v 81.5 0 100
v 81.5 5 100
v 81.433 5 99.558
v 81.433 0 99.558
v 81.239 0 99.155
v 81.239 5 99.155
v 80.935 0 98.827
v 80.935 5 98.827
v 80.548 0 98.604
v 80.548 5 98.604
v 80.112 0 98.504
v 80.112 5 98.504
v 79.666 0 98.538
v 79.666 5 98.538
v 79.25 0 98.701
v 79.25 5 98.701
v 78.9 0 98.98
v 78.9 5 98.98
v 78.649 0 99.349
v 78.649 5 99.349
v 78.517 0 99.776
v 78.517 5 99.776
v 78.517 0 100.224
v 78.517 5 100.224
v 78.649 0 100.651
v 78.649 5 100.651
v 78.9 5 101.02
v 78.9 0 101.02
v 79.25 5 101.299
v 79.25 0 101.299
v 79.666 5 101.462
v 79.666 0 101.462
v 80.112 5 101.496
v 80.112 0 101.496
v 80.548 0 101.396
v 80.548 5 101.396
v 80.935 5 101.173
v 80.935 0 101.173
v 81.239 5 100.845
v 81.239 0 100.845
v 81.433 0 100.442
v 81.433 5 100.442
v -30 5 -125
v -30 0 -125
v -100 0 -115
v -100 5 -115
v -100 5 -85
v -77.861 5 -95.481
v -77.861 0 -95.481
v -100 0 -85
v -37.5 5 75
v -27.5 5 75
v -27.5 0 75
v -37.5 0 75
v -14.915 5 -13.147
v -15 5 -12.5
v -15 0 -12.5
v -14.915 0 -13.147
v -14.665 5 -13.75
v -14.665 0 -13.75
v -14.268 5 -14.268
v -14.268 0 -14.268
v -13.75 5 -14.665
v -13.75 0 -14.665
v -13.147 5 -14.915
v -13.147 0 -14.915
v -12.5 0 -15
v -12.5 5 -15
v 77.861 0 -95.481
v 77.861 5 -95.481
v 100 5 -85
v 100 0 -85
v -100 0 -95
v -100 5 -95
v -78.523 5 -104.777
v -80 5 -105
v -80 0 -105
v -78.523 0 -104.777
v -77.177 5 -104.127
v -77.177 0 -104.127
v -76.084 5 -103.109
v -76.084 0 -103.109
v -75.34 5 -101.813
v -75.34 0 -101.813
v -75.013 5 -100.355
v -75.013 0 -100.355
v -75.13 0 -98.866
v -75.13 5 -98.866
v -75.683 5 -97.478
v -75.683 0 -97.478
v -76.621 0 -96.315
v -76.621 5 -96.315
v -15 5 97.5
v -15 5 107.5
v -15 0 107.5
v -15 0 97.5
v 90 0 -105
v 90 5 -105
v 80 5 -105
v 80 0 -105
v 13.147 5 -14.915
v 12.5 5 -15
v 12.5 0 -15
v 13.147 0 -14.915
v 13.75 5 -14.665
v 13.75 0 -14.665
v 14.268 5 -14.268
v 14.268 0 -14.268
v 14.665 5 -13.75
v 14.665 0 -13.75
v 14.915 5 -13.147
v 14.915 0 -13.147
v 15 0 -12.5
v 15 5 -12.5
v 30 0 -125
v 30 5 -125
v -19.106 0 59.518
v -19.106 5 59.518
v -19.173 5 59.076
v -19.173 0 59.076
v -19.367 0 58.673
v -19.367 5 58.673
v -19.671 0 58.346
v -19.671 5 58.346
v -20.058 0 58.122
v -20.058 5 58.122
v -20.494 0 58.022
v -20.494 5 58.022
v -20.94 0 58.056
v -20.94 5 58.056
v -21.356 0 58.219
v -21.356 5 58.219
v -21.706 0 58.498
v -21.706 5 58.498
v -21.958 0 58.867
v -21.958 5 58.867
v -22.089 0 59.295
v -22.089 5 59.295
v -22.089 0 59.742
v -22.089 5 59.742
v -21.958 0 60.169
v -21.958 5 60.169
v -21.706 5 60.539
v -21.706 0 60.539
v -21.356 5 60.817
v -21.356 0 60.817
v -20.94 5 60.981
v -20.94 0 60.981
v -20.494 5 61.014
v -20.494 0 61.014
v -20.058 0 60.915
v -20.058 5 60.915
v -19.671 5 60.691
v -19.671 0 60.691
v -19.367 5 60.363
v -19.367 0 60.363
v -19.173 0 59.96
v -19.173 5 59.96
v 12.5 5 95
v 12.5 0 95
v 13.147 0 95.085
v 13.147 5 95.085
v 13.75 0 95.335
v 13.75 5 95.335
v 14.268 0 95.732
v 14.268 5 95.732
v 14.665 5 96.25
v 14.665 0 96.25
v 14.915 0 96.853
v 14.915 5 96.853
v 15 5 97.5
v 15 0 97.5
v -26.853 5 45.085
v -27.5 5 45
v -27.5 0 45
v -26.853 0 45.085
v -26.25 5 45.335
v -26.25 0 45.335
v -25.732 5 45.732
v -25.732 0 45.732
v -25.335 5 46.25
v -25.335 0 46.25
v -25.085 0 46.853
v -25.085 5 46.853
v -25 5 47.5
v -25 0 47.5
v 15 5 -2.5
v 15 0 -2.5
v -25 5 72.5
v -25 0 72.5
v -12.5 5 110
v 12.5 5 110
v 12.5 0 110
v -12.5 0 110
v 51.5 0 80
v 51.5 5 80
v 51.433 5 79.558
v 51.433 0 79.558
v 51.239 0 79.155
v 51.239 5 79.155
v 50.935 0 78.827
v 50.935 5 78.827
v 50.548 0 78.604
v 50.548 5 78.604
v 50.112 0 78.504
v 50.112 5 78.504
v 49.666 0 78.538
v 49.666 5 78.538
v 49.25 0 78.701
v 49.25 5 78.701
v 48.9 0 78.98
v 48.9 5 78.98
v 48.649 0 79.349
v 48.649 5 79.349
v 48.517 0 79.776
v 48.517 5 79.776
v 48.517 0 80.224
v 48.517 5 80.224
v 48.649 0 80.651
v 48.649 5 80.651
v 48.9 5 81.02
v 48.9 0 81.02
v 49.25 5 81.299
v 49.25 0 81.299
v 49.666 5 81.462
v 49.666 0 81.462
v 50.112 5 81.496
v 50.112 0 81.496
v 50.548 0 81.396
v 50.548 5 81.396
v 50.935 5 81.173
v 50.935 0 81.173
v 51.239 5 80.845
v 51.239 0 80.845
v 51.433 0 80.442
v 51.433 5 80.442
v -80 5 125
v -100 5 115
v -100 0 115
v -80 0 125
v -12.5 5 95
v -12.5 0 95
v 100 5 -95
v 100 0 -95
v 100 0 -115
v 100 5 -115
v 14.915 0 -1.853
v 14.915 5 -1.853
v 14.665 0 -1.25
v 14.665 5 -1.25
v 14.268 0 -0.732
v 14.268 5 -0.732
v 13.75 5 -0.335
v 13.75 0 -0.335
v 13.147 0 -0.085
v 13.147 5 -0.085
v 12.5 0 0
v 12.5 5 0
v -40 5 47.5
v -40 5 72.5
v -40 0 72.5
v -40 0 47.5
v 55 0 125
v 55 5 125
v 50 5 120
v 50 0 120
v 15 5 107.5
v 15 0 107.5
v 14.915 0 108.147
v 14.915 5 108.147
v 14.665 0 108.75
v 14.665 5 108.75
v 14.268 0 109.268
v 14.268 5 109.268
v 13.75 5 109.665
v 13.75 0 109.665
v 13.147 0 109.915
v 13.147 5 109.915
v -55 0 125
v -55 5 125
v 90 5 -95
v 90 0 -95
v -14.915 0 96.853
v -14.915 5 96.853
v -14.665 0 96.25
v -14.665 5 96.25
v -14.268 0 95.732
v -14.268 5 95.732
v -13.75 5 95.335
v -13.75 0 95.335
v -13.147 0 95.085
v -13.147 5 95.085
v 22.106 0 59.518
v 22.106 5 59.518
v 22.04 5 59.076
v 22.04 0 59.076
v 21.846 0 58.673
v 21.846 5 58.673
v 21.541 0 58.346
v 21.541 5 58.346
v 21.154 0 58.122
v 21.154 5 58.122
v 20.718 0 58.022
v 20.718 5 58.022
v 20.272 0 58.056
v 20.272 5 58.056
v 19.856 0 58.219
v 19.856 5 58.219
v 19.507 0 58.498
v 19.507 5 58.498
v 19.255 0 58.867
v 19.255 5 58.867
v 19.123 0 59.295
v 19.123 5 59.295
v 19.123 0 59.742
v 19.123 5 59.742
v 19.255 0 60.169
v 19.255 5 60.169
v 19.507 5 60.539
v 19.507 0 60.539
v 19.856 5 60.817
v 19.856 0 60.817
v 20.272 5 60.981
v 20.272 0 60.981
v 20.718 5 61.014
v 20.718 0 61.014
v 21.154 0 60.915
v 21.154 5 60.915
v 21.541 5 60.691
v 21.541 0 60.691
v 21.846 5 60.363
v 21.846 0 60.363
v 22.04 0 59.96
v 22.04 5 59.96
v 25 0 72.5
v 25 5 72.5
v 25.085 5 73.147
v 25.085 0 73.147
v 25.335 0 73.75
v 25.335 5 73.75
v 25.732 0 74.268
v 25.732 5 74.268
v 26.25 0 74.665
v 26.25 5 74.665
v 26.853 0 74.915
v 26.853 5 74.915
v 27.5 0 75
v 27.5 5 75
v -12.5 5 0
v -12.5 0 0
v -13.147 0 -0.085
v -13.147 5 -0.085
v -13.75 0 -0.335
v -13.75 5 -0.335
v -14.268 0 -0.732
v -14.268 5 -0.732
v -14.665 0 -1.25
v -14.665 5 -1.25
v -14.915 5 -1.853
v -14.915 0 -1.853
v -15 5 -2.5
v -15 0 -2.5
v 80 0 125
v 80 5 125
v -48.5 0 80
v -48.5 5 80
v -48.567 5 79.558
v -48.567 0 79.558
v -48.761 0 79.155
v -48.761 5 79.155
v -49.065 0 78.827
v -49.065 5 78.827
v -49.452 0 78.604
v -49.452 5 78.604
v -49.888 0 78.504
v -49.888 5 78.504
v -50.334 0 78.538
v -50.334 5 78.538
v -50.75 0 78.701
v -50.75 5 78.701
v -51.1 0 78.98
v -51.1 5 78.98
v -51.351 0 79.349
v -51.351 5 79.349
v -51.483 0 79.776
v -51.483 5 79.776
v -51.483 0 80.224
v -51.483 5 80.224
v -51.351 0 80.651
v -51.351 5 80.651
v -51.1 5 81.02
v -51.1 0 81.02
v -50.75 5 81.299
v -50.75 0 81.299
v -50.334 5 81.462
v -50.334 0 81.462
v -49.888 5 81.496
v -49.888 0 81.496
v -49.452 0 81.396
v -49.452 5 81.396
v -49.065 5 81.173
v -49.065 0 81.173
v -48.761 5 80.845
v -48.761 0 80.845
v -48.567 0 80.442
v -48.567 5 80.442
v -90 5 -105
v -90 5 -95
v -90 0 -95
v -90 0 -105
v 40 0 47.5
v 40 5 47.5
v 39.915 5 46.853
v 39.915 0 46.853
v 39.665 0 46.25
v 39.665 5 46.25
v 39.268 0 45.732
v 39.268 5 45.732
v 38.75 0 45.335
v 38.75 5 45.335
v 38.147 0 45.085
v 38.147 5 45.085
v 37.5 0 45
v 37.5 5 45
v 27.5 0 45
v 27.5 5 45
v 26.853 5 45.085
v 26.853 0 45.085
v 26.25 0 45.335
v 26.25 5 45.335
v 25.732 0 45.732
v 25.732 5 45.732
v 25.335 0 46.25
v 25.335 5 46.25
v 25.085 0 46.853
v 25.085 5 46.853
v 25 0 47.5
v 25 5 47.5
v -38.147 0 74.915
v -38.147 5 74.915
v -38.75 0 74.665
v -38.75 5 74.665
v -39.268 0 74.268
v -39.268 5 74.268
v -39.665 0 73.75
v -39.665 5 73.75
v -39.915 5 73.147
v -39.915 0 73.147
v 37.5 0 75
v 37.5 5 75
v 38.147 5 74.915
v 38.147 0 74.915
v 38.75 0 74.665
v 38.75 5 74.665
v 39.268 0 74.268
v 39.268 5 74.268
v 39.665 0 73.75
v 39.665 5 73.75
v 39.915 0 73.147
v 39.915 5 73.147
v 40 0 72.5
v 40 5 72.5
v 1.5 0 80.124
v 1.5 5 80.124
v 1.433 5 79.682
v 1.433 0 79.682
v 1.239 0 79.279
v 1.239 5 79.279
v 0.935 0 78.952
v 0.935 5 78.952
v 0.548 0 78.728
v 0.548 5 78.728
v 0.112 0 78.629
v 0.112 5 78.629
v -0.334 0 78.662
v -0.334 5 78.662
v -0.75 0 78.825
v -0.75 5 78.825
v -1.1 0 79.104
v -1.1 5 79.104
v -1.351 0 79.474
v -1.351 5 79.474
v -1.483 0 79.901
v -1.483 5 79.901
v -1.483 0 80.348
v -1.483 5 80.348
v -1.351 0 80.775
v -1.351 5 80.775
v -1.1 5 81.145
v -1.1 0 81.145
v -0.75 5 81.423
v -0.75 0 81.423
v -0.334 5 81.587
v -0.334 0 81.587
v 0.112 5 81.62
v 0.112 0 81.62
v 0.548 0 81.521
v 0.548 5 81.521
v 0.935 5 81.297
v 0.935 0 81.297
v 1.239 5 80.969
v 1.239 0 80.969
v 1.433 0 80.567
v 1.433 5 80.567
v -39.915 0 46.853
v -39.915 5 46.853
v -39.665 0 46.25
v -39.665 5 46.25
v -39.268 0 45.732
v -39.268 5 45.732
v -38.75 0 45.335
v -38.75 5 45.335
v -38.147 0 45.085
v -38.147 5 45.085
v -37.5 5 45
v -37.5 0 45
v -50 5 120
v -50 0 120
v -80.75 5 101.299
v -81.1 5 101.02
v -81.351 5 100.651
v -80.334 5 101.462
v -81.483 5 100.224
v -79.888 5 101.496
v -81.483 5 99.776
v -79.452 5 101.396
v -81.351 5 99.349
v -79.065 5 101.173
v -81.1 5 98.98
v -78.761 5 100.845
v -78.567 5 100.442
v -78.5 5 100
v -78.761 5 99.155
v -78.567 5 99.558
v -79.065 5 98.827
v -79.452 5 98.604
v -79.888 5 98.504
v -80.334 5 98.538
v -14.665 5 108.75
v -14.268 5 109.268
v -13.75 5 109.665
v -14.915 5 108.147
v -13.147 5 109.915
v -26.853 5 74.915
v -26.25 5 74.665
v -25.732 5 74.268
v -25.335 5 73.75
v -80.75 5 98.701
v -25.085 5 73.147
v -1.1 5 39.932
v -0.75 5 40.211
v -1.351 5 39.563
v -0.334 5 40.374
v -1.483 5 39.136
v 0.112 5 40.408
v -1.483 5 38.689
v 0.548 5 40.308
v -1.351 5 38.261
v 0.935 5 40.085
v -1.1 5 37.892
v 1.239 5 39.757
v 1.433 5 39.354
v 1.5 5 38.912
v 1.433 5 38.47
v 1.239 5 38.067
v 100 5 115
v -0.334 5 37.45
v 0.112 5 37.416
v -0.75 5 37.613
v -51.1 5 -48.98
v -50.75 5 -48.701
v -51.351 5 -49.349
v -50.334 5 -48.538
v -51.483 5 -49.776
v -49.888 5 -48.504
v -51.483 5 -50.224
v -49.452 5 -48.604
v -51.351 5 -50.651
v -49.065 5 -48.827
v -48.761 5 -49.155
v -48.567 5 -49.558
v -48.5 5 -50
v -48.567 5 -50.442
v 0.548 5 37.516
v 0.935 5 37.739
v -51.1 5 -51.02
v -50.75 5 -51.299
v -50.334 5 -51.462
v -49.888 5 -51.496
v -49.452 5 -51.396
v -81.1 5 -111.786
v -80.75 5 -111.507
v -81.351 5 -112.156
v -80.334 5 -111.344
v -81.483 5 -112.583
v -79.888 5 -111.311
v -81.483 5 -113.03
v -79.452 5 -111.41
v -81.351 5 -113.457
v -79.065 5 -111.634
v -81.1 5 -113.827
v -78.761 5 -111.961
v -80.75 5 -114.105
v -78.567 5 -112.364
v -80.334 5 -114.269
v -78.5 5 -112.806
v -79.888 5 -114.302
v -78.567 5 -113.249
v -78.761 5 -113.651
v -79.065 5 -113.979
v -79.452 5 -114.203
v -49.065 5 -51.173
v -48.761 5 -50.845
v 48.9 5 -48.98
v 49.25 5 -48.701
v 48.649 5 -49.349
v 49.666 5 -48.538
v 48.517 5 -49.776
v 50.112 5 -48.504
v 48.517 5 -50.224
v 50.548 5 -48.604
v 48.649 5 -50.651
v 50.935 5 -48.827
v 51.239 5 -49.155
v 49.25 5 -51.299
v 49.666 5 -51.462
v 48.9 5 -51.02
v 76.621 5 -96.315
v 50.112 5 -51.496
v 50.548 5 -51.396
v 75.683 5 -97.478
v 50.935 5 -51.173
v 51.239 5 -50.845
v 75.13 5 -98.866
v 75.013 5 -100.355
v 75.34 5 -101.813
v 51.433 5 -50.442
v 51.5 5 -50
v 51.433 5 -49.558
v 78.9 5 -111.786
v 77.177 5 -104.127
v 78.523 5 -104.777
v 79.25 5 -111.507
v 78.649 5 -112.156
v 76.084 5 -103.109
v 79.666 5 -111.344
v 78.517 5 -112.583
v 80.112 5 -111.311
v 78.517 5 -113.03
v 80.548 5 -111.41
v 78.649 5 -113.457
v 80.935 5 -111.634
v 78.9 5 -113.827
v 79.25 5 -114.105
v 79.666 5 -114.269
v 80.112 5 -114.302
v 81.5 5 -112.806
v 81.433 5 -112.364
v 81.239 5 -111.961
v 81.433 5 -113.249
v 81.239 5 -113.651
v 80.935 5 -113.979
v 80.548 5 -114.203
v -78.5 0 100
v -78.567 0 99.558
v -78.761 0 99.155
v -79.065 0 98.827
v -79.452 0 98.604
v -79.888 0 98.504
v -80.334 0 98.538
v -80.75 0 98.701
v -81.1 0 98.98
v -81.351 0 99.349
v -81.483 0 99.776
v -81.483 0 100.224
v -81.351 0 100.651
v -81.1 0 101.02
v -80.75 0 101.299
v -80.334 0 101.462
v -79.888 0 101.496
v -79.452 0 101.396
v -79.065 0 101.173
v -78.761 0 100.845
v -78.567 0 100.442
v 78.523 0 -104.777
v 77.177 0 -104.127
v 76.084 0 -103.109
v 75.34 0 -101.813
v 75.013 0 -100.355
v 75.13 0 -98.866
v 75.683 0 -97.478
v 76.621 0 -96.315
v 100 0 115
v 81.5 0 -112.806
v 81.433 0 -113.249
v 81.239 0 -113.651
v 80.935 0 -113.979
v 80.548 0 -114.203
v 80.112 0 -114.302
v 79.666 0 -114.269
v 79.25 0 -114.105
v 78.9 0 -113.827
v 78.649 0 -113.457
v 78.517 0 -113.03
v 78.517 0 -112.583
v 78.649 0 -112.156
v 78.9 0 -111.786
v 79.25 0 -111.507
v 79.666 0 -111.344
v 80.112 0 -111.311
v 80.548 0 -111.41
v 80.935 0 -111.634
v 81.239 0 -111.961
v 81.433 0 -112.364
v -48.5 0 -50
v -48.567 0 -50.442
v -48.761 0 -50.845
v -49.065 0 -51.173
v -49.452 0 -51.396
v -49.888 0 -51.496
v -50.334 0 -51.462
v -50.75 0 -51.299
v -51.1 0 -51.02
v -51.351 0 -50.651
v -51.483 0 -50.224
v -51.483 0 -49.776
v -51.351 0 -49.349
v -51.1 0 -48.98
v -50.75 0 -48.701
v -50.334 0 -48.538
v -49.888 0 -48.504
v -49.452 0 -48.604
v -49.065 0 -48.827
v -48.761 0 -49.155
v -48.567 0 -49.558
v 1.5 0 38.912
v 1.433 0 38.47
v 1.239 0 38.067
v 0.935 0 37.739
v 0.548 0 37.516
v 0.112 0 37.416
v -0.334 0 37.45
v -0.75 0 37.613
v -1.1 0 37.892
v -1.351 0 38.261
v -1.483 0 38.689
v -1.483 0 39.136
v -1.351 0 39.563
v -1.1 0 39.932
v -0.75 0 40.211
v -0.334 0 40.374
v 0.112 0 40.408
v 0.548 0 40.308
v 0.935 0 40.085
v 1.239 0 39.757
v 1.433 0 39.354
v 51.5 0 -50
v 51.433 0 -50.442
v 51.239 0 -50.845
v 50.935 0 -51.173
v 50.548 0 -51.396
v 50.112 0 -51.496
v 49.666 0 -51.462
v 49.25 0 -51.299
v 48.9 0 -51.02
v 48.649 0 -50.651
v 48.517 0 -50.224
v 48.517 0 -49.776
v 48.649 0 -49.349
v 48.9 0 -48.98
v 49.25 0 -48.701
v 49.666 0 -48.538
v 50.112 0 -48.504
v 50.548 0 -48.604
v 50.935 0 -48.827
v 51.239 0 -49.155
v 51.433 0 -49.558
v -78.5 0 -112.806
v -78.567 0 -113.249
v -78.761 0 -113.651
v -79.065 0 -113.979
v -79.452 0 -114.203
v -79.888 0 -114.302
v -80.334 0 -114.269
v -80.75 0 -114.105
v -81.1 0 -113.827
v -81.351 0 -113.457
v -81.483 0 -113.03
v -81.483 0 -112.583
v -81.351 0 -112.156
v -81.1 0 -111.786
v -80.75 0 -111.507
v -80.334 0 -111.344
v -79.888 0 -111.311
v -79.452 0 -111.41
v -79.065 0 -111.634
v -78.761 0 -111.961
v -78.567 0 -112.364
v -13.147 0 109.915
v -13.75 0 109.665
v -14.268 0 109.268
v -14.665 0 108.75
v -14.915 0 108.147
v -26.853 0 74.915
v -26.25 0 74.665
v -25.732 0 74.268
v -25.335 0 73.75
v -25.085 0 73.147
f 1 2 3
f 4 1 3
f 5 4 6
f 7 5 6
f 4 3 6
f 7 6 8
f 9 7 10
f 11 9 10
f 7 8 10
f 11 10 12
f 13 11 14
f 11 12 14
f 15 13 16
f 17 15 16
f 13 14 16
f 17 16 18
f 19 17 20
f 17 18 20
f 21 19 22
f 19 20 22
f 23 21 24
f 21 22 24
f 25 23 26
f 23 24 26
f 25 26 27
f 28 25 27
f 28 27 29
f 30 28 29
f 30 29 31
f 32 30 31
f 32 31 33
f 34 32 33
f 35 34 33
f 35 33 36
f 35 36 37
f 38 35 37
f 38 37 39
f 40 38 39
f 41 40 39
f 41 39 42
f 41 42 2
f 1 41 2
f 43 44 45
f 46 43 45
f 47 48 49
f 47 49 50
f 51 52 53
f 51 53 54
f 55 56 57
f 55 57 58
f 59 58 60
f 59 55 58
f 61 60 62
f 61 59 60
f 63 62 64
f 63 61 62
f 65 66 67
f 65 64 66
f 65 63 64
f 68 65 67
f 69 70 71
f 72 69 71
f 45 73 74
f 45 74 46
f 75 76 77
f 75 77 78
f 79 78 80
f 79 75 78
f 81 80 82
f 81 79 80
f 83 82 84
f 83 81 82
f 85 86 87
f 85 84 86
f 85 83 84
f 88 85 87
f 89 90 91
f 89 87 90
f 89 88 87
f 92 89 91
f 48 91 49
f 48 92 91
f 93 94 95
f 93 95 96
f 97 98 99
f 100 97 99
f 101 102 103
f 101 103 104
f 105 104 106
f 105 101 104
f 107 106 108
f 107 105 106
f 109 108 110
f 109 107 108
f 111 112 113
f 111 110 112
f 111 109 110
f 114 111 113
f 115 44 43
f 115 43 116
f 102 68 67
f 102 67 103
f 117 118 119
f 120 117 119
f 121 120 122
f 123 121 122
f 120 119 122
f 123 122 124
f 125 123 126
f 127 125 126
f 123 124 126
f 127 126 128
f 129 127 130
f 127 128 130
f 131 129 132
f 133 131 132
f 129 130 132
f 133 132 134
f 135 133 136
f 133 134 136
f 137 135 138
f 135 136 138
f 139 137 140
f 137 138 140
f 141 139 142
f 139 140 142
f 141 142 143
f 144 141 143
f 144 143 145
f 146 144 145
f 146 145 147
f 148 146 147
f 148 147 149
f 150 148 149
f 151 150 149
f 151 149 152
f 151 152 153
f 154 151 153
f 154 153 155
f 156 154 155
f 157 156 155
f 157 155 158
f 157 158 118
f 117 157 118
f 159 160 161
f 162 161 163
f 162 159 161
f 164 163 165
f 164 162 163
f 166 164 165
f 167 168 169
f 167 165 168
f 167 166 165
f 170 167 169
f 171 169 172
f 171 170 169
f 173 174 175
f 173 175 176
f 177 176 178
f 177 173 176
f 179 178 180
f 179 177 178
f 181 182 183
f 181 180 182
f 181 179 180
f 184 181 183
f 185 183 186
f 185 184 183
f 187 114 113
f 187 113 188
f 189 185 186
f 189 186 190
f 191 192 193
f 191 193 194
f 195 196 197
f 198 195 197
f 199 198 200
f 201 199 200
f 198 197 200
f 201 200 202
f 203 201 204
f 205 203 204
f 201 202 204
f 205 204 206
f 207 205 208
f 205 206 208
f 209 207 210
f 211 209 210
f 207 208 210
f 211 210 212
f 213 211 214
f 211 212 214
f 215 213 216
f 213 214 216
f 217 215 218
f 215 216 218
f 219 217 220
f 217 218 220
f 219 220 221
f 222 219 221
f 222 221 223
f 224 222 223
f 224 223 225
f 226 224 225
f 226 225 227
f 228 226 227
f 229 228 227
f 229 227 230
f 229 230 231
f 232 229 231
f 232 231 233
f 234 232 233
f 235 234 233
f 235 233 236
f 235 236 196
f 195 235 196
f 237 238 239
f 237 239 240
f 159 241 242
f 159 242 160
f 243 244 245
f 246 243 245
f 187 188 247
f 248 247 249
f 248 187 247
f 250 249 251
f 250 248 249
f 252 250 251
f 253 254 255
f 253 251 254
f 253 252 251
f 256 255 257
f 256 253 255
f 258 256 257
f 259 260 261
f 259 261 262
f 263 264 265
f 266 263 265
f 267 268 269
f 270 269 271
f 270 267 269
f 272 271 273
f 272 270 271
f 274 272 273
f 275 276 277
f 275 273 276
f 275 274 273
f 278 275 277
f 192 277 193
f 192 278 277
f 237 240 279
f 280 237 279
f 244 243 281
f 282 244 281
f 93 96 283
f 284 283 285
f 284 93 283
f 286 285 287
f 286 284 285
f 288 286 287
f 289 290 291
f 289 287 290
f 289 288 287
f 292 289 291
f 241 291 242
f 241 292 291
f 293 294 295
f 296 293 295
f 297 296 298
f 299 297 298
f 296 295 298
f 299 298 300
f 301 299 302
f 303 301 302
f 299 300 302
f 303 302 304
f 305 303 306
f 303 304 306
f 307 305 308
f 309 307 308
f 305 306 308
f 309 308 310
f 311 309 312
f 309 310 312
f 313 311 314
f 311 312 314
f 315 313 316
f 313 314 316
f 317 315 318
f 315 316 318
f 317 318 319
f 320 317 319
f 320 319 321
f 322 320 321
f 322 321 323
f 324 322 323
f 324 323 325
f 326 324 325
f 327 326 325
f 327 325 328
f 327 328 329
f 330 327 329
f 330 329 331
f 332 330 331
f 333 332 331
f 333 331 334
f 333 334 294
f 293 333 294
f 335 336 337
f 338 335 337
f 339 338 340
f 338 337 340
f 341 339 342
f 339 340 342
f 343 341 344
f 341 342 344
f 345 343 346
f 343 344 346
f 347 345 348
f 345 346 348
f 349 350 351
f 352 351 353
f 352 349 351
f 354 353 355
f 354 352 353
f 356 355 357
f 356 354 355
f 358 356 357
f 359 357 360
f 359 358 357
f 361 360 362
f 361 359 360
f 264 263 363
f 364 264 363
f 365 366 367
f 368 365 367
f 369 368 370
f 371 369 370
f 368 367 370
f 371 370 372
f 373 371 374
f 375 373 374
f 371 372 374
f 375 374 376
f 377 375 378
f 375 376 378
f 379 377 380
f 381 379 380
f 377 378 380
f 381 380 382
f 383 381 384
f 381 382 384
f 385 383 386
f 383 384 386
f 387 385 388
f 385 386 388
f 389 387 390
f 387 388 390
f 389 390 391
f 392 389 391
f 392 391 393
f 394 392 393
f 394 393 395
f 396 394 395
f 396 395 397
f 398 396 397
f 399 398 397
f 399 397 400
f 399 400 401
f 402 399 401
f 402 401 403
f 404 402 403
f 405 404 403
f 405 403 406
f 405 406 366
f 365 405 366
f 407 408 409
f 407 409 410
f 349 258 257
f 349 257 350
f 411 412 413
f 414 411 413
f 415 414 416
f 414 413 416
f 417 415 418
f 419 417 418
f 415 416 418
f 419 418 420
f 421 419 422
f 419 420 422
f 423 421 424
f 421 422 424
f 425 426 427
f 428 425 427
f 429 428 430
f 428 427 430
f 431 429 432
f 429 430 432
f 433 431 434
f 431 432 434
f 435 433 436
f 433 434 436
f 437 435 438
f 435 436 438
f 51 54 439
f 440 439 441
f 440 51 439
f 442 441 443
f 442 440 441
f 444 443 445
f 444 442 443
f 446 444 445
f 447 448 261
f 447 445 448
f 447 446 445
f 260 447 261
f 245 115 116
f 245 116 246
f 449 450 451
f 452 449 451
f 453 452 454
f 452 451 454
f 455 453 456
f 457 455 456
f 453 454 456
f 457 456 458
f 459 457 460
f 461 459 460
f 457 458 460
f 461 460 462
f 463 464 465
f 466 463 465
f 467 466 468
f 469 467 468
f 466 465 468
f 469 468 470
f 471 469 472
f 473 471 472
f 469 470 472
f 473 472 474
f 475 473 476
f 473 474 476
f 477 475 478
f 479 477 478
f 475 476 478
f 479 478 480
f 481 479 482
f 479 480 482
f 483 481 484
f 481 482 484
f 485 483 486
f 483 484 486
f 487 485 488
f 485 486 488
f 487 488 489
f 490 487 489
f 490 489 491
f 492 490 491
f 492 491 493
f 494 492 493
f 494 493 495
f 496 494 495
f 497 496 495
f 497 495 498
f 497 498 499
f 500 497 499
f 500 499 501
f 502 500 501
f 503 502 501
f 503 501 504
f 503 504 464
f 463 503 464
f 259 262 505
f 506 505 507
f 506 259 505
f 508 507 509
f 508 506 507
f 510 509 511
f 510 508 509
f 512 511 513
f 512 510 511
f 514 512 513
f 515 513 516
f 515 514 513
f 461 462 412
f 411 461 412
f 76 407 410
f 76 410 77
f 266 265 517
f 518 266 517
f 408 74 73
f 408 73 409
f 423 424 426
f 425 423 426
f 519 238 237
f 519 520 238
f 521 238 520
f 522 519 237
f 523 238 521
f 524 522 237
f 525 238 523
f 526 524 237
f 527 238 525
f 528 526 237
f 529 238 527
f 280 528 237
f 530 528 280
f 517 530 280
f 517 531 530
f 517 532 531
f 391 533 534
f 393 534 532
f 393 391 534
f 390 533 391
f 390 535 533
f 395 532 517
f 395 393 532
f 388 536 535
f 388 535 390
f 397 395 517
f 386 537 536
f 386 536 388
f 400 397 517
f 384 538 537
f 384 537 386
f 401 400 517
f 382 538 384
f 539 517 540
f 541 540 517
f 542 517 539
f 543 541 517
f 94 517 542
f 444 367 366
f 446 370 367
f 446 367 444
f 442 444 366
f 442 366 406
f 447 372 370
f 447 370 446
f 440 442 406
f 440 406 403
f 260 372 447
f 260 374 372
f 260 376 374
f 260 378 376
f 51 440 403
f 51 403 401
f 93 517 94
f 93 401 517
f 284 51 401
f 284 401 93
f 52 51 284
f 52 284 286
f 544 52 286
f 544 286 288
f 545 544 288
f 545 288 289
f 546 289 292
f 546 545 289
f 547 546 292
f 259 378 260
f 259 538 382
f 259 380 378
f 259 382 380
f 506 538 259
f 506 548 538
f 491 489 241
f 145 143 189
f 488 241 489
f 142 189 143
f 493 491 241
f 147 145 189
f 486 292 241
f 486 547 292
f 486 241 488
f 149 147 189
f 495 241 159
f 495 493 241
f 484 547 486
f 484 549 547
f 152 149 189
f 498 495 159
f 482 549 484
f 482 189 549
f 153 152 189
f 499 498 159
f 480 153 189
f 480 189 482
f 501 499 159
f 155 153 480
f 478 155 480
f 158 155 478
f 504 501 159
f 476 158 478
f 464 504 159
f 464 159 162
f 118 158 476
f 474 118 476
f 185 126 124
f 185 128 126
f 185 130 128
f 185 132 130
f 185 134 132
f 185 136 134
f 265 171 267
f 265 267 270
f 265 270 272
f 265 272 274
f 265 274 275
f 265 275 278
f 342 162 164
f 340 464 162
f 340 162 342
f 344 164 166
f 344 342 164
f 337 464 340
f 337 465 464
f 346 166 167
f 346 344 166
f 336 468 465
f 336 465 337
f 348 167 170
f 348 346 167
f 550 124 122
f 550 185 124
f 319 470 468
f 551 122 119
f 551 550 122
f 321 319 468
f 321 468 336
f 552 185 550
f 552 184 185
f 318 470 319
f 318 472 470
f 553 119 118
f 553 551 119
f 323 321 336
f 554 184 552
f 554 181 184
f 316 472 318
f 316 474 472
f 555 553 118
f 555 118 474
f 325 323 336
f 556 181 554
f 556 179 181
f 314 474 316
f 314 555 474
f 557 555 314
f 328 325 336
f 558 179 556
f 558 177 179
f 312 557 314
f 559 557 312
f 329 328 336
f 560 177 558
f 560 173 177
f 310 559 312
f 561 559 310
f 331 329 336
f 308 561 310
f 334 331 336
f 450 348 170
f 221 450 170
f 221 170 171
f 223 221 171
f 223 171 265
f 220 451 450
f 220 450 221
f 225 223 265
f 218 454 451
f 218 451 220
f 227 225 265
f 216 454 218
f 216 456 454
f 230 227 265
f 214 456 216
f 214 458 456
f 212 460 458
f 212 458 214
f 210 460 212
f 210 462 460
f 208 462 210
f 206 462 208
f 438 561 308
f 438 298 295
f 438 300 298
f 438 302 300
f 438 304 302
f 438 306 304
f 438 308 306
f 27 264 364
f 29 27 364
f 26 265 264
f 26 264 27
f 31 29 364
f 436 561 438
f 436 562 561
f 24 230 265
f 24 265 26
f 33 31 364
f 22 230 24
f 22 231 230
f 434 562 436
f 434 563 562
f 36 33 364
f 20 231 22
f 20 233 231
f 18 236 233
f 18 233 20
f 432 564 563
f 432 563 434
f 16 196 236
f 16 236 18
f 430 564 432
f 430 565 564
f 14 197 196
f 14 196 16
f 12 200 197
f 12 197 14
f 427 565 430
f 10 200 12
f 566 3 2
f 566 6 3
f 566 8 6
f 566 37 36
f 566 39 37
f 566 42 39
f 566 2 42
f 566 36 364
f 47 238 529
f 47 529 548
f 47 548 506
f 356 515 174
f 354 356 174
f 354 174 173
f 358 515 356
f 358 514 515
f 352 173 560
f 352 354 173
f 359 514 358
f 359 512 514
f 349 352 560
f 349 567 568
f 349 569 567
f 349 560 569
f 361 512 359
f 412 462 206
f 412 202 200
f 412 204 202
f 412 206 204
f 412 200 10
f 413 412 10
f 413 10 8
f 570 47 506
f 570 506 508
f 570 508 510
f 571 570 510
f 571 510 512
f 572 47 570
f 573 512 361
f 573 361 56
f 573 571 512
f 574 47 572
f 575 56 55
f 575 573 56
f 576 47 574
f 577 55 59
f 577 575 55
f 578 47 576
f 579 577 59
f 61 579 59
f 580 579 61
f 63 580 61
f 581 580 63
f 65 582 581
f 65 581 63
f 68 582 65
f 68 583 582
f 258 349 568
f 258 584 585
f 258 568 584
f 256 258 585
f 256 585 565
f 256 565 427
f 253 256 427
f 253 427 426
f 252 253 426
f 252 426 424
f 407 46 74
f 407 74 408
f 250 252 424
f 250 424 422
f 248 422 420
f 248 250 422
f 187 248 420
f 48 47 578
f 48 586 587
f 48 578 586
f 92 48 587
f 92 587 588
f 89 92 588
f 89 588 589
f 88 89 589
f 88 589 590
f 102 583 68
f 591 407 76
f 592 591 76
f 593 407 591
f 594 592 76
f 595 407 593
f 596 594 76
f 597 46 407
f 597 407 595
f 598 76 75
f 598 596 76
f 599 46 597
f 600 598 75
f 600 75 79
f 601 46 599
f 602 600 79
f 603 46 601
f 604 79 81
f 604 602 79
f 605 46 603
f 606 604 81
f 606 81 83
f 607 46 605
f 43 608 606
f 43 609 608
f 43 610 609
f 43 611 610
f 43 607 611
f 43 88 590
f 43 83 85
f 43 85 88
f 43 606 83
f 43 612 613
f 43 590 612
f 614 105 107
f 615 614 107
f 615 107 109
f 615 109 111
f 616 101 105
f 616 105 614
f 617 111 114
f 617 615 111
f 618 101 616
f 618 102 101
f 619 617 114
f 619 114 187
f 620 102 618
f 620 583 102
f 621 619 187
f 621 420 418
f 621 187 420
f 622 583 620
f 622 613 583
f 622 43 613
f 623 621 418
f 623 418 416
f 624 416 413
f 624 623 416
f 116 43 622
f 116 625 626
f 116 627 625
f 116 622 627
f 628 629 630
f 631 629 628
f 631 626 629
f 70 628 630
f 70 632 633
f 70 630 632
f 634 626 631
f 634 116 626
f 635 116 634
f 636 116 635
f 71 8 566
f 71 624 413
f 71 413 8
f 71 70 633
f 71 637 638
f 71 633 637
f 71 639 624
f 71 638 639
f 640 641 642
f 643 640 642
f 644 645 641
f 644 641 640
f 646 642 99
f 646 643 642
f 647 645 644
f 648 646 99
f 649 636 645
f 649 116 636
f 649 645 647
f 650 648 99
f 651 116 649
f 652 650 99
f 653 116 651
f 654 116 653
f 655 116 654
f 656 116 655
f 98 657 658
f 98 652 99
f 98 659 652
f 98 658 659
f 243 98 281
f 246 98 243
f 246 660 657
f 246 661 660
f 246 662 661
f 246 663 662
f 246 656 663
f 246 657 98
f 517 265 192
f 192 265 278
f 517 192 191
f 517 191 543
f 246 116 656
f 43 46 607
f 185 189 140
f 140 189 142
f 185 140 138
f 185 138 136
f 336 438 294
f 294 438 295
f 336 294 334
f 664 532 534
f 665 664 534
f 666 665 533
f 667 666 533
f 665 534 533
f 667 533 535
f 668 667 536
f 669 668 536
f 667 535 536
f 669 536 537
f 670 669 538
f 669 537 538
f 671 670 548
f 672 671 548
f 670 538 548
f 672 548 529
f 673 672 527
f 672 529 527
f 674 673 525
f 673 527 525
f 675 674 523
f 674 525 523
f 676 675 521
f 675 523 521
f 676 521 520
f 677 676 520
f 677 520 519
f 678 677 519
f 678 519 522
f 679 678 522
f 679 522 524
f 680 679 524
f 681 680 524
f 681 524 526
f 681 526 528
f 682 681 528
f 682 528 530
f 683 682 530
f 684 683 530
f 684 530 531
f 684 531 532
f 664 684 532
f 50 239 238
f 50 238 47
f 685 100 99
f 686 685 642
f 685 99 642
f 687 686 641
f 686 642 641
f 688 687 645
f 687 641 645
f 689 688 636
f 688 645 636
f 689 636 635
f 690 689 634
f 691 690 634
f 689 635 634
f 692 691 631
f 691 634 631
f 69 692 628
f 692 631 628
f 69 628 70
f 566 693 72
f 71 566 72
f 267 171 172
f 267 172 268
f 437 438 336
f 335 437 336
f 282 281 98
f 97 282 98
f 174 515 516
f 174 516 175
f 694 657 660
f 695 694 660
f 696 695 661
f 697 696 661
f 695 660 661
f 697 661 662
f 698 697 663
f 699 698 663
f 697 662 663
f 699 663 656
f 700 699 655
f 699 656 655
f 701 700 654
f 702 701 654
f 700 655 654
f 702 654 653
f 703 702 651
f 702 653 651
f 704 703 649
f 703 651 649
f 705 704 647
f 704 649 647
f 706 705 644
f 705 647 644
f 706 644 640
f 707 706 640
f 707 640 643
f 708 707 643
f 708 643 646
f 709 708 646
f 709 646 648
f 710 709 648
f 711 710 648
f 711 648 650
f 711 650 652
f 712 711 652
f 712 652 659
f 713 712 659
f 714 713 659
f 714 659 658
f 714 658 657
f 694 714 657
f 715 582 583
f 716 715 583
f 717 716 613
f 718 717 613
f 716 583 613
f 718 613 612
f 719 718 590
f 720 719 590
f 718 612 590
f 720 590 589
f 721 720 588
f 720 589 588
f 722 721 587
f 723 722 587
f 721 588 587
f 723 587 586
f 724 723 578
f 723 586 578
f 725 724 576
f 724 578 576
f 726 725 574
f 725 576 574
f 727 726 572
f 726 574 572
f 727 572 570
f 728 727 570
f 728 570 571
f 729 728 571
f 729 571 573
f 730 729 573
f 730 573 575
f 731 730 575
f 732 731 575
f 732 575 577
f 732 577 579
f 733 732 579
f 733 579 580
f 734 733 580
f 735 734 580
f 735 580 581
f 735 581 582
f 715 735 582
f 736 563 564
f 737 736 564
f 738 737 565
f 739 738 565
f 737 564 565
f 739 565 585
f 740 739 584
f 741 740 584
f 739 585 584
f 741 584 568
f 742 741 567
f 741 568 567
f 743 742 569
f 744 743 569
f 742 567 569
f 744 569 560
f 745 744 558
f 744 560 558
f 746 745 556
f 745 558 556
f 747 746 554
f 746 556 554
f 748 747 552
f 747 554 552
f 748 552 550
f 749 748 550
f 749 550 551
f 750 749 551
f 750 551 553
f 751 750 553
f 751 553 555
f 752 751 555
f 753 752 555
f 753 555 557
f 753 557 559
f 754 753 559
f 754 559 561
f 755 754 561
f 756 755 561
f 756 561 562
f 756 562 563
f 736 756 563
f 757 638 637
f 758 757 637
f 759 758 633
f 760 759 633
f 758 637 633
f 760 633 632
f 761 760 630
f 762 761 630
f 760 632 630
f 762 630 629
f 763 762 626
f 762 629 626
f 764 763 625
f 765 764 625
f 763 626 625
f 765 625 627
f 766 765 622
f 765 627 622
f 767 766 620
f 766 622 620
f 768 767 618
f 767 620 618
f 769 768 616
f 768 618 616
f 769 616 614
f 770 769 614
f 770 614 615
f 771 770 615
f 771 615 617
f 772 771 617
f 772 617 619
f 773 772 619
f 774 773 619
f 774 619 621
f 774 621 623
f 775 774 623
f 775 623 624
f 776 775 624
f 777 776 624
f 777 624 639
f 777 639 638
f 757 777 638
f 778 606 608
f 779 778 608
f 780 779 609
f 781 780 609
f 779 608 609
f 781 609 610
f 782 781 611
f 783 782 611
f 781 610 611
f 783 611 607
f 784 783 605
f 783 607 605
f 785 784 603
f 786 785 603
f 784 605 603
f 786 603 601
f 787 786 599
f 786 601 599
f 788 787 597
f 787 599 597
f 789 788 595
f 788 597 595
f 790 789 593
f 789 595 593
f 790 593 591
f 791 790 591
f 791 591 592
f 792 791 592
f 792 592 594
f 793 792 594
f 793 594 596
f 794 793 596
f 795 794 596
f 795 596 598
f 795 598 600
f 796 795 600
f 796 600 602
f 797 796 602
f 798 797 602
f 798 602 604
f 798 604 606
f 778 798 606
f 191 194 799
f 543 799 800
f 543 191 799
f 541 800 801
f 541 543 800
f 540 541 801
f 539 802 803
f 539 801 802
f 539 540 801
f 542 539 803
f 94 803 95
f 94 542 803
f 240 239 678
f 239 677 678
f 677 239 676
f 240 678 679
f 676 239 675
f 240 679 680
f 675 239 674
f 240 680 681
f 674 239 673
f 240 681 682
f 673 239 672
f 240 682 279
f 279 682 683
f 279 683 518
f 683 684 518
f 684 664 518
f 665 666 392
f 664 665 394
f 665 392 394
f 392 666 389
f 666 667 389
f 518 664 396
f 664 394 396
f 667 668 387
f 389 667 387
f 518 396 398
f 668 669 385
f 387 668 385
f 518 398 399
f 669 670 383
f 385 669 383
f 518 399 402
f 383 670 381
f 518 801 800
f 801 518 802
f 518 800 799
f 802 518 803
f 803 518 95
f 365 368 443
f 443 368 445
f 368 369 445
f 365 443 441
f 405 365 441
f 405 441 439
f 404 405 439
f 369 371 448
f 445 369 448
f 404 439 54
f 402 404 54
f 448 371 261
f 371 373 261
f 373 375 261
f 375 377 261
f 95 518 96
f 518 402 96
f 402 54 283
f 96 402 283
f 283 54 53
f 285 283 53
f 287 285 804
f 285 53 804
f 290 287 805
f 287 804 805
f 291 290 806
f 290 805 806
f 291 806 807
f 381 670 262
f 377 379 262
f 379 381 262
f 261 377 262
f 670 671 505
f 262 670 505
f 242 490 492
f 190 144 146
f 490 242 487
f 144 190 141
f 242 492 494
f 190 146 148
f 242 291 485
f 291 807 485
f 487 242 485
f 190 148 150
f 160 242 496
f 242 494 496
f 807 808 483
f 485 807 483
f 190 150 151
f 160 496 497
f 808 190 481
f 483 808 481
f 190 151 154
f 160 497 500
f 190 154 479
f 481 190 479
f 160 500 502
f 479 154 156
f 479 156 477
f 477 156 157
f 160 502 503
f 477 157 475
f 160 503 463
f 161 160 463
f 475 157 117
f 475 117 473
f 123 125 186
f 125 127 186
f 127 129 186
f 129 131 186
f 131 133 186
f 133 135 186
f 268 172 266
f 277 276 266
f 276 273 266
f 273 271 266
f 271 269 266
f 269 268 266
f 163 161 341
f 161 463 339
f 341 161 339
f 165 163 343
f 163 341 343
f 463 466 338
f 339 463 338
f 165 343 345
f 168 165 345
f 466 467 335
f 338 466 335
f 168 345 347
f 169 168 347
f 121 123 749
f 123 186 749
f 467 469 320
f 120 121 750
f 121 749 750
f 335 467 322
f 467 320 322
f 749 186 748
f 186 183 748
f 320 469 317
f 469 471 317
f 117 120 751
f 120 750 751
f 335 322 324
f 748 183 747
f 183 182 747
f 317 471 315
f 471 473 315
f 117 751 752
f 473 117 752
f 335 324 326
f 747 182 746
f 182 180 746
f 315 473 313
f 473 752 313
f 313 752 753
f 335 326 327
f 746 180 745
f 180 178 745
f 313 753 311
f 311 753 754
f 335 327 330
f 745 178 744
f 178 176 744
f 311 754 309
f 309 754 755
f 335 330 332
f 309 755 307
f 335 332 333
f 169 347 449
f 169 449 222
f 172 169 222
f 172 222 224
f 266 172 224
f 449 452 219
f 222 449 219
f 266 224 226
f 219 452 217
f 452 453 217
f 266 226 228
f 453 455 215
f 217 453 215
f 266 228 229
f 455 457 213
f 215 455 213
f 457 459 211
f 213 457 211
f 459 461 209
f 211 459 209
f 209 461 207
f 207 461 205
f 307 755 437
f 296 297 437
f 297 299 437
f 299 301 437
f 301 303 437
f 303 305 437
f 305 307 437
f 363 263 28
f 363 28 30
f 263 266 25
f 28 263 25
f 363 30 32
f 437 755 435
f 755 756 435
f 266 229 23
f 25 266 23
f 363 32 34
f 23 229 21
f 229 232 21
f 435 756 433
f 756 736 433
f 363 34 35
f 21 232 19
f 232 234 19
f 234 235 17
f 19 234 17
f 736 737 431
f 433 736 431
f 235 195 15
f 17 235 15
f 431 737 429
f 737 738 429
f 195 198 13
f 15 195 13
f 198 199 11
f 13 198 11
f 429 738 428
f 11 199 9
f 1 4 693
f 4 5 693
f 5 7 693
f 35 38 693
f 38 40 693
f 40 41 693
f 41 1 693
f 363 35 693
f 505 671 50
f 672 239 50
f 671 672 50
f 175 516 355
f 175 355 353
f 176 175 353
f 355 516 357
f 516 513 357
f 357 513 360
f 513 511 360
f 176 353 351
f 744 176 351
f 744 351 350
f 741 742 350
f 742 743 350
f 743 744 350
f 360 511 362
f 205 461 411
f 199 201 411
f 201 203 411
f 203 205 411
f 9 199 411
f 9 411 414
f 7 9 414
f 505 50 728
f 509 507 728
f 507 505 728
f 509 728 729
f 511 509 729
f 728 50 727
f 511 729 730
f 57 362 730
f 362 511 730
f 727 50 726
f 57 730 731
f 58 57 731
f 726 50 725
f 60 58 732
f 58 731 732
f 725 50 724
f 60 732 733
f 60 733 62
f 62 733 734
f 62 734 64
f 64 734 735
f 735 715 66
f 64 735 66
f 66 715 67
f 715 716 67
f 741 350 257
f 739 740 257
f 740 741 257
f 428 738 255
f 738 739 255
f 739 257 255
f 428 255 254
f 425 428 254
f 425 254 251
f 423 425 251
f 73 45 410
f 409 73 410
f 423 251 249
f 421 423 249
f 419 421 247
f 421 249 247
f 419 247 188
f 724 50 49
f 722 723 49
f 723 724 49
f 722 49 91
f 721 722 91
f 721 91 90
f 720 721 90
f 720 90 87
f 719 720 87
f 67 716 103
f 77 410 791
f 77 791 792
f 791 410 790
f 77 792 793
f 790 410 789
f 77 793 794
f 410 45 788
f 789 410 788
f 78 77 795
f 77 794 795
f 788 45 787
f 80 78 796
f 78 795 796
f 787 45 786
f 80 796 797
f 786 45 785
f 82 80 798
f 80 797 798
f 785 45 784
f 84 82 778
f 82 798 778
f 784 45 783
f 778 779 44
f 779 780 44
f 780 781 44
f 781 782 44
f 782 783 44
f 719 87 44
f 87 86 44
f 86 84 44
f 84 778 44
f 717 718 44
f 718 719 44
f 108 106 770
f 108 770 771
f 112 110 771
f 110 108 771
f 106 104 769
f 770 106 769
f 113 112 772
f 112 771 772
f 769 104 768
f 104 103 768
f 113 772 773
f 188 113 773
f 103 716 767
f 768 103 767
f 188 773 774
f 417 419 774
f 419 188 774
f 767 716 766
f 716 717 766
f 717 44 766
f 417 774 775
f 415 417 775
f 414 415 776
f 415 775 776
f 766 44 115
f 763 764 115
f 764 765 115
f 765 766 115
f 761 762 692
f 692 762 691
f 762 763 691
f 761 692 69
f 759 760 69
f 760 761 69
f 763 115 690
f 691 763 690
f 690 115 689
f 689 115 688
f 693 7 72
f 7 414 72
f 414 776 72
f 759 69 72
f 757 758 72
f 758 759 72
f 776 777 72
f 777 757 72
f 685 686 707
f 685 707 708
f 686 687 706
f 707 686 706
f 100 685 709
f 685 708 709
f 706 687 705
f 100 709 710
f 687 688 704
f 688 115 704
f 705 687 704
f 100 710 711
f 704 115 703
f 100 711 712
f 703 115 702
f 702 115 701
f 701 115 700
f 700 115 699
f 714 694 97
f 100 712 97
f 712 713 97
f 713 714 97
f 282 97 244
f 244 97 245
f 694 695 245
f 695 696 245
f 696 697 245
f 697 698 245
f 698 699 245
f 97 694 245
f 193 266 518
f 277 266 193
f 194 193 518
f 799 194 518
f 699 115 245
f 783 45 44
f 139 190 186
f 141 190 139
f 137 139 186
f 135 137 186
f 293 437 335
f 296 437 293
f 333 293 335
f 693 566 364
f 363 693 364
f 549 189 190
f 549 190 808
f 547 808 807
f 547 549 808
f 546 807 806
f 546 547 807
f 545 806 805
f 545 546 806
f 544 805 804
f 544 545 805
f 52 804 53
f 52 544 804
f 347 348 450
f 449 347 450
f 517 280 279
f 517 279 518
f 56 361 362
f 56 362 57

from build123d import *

# Parameters (mm, degrees)
SKETCH_1_W           = 200
SKETCH_1_H           = 250
EXTRUDE_1_DEPTH      = 5
CUT_EXTRUDE_1_DEPTH  = 35
CUT_EXTRUDE_2_DEPTH  = 35
CUT_EXTRUDE_3_DEPTH  = 35
CUT_EXTRUDE_5_DEPTH  = 30
CUT_EXTRUDE_6_DEPTH  = 10
CUT_EXTRUDE_7_DEPTH  = 10
SKETCH_9_R           = 1.5
CUT_EXTRUDE_8_DEPTH  = 10
SKETCH_10_R          = 1.5
CUT_EXTRUDE_9_DEPTH  = 10
SKETCH_12_R          = 1.5
CUT_EXTRUDE_10_DEPTH = 10
SKETCH_13_R          = 1.5
CUT_EXTRUDE_11_DEPTH = 10


with BuildPart() as part:
    # 草图1 → 凸台-拉伸1 (new body)
    with BuildSketch(Plane(origin=(0, 0, 0), x_dir=(1, 0, 0), z_dir=(0, 1, 0))):
        Rectangle(SKETCH_1_W, SKETCH_1_H)
    extrude(amount=EXTRUDE_1_DEPTH)

    # 草图2 → 切除-拉伸1 (cut)
    with BuildSketch(Plane(origin=(0, 5, 0), x_dir=(1, 0, 0), z_dir=(0, 1, 0))):
        Polygon((-100, -115), (-80, -125), (-100, -125), align=None)
    cut_extrude_1 = extrude(amount=-CUT_EXTRUDE_1_DEPTH, mode=Mode.SUBTRACT)

    # 镜向1: 切除-拉伸1 across plane
    add(cut_extrude_1.mirror(Plane(origin=(0, 0, 0), x_dir=(0, 0, 1), z_dir=(1, 0, 0))), mode=Mode.SUBTRACT)

    # 草图3 → 切除-拉伸2 (cut)
    with BuildSketch(Plane(origin=(0, 5, 0), x_dir=(1, 0, 0), z_dir=(0, 1, 0))):
        Polygon((-55, -125), (-50, -120), (0, -120), (0, -125), align=None)
    cut_extrude_2 = extrude(amount=-CUT_EXTRUDE_2_DEPTH, mode=Mode.SUBTRACT)

    # 镜向2: 切除-拉伸2 across plane
    add(cut_extrude_2.mirror(Plane(origin=(0, 0, 0), x_dir=(0, 0, 1), z_dir=(1, 0, 0))), mode=Mode.SUBTRACT)

    # 草图4 → 切除-拉伸3 (cut)
    with BuildSketch(Plane(origin=(0, 5, 0), x_dir=(1, 0, 0), z_dir=(0, 1, 0))):
        with BuildLine():
            Line((-12.5, -95), (12.5, -95))
            ThreePointArc((12.5, -95), (14.267766953, -95.732233047), (15, -97.5))
            Line((15, -97.5), (15, -107.5))
            ThreePointArc((15, -107.5), (14.267766953, -109.267766953), (12.5, -110))
            Line((12.5, -110), (-12.5, -110))
            ThreePointArc((-12.5, -110), (-14.267766953, -109.267766953), (-15, -107.5))
            Line((-15, -107.5), (-15, -97.5))
            ThreePointArc((-15, -97.5), (-14.267766953, -95.732233047), (-12.5, -95))
        make_face()
    extrude(amount=-CUT_EXTRUDE_3_DEPTH, mode=Mode.SUBTRACT)

    # 草图5 → 切除-拉伸5 (cut)
    with BuildSketch(Plane(origin=(0, 0, 0), x_dir=(1, 0, 0), z_dir=(0, 1, 0))):
        Polygon((-30, 125), (-100, 115), (-100, 125), align=None)
    cut_extrude_5 = extrude(amount=CUT_EXTRUDE_5_DEPTH, mode=Mode.SUBTRACT)

    # 镜向3: 切除-拉伸5 across plane
    add(cut_extrude_5.mirror(Plane(origin=(0, 0, 0), x_dir=(0, 0, 1), z_dir=(1, 0, 0))), mode=Mode.SUBTRACT)

    # 草图6 → 切除-拉伸6 (cut)
    with BuildSketch(Plane(origin=(0, 5, 0), x_dir=(1, 0, 0), z_dir=(0, 1, 0))):
        with BuildLine():
            Line((-100, 95), (-90, 95))
            Line((-90, 95), (-90, 105))
            Line((-90, 105), (-80, 105))
            ThreePointArc((-80, 105), (-75.121684822, 101.096376317), (-77.860612309, 95.480816412))
            Line((-77.860612309, 95.480816412), (-100, 85))
            Line((-100, 85), (-100, 95))
        make_face()
    cut_extrude_6 = extrude(amount=-CUT_EXTRUDE_6_DEPTH, mode=Mode.SUBTRACT)

    # 镜向4: 切除-拉伸6 across plane
    add(cut_extrude_6.mirror(Plane(origin=(0, 0, 0), x_dir=(0, 0, 1), z_dir=(1, 0, 0))), mode=Mode.SUBTRACT)

    # 草图8 → 切除-拉伸7 (cut)
    with BuildSketch(Plane(origin=(0, 5, 0), x_dir=(1, 0, 0), z_dir=(0, 1, 0))):
        with BuildLine():
            Line((-37.5, -45), (-27.5, -45))
            ThreePointArc((-27.5, -45), (-25.732233047, -45.732233047), (-25, -47.5))
            Line((-25, -47.5), (-25, -72.5))
            ThreePointArc((-25, -72.5), (-25.732233047, -74.267766953), (-27.5, -75))
            Line((-27.5, -75), (-37.5, -75))
            ThreePointArc((-37.5, -75), (-39.267766953, -74.267766953), (-40, -72.5))
            Line((-40, -72.5), (-40, -47.5))
            ThreePointArc((-40, -47.5), (-39.267766953, -45.732233047), (-37.5, -45))
        make_face()
        with BuildLine():
            Line((25, -47.5), (25, -72.5))
            ThreePointArc((25, -72.5), (25.732233047, -74.267766953), (27.5, -75))
            Line((27.5, -75), (37.5, -75))
            ThreePointArc((37.5, -75), (39.267766953, -74.267766953), (40, -72.5))
            Line((40, -72.5), (40, -47.5))
            ThreePointArc((40, -47.5), (39.267766953, -45.732233047), (37.5, -45))
            Line((37.5, -45), (27.5, -45))
            ThreePointArc((27.5, -45), (25.732233047, -45.732233047), (25, -47.5))
        make_face()
        with BuildLine():
            Line((-12.5, 15), (12.5, 15))
            ThreePointArc((12.5, 15), (14.267766953, 14.267766953), (15, 12.5))
            Line((15, 12.5), (15, 2.5))
            ThreePointArc((15, 2.5), (14.267766953, 0.732233047), (12.5, 0))
            Line((12.5, 0), (-12.5, 0))
            ThreePointArc((-12.5, 0), (-14.267766953, 0.732233047), (-15, 2.5))
            Line((-15, 2.5), (-15, 12.5))
            ThreePointArc((-15, 12.5), (-14.267766953, 14.267766953), (-12.5, 15))
        make_face()
    extrude(amount=-CUT_EXTRUDE_7_DEPTH, mode=Mode.SUBTRACT)

    # 草图9 → 切除-拉伸8 (cut)
    with BuildSketch(Plane(origin=(0, 5, 0), x_dir=(1, 0, 0), z_dir=(0, 1, 0))):
        with Locations((-80, -100)):
            Circle(SKETCH_9_R)
        with Locations((80, -100)):
            Circle(SKETCH_9_R)
    extrude(amount=-CUT_EXTRUDE_8_DEPTH, mode=Mode.SUBTRACT)

    # 草图10 → 切除-拉伸9 (cut)
    with BuildSketch(Plane(origin=(0, 5, 0), x_dir=(1, 0, 0), z_dir=(0, 1, 0))):
        with Locations((-80, 112.806380134)):
            Circle(SKETCH_10_R)
        with Locations((80, 112.806380134)):
            Circle(SKETCH_10_R)
    extrude(amount=-CUT_EXTRUDE_9_DEPTH, mode=Mode.SUBTRACT)

    # 草图12 → 切除-拉伸10 (cut)
    with BuildSketch(Plane(origin=(0, 5, 0), x_dir=(1, 0, 0), z_dir=(0, 1, 0))):
        with Locations((0, -38.912086487)):
            Circle(SKETCH_12_R)
        with Locations((-20.60616084, -59.518247327)):
            Circle(SKETCH_12_R)
        with Locations((20.60616084, -59.518247327)):
            Circle(SKETCH_12_R)
        with Locations((0, -80.124408167)):
            Circle(SKETCH_12_R)
    extrude(amount=-CUT_EXTRUDE_10_DEPTH, mode=Mode.SUBTRACT)

    # 草图13 → 切除-拉伸11 (cut)
    with BuildSketch(Plane(origin=(0, 5, 0), x_dir=(1, 0, 0), z_dir=(0, 1, 0))):
        with Locations((-50, -80)):
            Circle(SKETCH_13_R)
        with Locations((50, -80)):
            Circle(SKETCH_13_R)
        with Locations((-50, 50)):
            Circle(SKETCH_13_R)
        with Locations((50, 50)):
            Circle(SKETCH_13_R)
    extrude(amount=-CUT_EXTRUDE_11_DEPTH, mode=Mode.SUBTRACT)


solid = part.part
